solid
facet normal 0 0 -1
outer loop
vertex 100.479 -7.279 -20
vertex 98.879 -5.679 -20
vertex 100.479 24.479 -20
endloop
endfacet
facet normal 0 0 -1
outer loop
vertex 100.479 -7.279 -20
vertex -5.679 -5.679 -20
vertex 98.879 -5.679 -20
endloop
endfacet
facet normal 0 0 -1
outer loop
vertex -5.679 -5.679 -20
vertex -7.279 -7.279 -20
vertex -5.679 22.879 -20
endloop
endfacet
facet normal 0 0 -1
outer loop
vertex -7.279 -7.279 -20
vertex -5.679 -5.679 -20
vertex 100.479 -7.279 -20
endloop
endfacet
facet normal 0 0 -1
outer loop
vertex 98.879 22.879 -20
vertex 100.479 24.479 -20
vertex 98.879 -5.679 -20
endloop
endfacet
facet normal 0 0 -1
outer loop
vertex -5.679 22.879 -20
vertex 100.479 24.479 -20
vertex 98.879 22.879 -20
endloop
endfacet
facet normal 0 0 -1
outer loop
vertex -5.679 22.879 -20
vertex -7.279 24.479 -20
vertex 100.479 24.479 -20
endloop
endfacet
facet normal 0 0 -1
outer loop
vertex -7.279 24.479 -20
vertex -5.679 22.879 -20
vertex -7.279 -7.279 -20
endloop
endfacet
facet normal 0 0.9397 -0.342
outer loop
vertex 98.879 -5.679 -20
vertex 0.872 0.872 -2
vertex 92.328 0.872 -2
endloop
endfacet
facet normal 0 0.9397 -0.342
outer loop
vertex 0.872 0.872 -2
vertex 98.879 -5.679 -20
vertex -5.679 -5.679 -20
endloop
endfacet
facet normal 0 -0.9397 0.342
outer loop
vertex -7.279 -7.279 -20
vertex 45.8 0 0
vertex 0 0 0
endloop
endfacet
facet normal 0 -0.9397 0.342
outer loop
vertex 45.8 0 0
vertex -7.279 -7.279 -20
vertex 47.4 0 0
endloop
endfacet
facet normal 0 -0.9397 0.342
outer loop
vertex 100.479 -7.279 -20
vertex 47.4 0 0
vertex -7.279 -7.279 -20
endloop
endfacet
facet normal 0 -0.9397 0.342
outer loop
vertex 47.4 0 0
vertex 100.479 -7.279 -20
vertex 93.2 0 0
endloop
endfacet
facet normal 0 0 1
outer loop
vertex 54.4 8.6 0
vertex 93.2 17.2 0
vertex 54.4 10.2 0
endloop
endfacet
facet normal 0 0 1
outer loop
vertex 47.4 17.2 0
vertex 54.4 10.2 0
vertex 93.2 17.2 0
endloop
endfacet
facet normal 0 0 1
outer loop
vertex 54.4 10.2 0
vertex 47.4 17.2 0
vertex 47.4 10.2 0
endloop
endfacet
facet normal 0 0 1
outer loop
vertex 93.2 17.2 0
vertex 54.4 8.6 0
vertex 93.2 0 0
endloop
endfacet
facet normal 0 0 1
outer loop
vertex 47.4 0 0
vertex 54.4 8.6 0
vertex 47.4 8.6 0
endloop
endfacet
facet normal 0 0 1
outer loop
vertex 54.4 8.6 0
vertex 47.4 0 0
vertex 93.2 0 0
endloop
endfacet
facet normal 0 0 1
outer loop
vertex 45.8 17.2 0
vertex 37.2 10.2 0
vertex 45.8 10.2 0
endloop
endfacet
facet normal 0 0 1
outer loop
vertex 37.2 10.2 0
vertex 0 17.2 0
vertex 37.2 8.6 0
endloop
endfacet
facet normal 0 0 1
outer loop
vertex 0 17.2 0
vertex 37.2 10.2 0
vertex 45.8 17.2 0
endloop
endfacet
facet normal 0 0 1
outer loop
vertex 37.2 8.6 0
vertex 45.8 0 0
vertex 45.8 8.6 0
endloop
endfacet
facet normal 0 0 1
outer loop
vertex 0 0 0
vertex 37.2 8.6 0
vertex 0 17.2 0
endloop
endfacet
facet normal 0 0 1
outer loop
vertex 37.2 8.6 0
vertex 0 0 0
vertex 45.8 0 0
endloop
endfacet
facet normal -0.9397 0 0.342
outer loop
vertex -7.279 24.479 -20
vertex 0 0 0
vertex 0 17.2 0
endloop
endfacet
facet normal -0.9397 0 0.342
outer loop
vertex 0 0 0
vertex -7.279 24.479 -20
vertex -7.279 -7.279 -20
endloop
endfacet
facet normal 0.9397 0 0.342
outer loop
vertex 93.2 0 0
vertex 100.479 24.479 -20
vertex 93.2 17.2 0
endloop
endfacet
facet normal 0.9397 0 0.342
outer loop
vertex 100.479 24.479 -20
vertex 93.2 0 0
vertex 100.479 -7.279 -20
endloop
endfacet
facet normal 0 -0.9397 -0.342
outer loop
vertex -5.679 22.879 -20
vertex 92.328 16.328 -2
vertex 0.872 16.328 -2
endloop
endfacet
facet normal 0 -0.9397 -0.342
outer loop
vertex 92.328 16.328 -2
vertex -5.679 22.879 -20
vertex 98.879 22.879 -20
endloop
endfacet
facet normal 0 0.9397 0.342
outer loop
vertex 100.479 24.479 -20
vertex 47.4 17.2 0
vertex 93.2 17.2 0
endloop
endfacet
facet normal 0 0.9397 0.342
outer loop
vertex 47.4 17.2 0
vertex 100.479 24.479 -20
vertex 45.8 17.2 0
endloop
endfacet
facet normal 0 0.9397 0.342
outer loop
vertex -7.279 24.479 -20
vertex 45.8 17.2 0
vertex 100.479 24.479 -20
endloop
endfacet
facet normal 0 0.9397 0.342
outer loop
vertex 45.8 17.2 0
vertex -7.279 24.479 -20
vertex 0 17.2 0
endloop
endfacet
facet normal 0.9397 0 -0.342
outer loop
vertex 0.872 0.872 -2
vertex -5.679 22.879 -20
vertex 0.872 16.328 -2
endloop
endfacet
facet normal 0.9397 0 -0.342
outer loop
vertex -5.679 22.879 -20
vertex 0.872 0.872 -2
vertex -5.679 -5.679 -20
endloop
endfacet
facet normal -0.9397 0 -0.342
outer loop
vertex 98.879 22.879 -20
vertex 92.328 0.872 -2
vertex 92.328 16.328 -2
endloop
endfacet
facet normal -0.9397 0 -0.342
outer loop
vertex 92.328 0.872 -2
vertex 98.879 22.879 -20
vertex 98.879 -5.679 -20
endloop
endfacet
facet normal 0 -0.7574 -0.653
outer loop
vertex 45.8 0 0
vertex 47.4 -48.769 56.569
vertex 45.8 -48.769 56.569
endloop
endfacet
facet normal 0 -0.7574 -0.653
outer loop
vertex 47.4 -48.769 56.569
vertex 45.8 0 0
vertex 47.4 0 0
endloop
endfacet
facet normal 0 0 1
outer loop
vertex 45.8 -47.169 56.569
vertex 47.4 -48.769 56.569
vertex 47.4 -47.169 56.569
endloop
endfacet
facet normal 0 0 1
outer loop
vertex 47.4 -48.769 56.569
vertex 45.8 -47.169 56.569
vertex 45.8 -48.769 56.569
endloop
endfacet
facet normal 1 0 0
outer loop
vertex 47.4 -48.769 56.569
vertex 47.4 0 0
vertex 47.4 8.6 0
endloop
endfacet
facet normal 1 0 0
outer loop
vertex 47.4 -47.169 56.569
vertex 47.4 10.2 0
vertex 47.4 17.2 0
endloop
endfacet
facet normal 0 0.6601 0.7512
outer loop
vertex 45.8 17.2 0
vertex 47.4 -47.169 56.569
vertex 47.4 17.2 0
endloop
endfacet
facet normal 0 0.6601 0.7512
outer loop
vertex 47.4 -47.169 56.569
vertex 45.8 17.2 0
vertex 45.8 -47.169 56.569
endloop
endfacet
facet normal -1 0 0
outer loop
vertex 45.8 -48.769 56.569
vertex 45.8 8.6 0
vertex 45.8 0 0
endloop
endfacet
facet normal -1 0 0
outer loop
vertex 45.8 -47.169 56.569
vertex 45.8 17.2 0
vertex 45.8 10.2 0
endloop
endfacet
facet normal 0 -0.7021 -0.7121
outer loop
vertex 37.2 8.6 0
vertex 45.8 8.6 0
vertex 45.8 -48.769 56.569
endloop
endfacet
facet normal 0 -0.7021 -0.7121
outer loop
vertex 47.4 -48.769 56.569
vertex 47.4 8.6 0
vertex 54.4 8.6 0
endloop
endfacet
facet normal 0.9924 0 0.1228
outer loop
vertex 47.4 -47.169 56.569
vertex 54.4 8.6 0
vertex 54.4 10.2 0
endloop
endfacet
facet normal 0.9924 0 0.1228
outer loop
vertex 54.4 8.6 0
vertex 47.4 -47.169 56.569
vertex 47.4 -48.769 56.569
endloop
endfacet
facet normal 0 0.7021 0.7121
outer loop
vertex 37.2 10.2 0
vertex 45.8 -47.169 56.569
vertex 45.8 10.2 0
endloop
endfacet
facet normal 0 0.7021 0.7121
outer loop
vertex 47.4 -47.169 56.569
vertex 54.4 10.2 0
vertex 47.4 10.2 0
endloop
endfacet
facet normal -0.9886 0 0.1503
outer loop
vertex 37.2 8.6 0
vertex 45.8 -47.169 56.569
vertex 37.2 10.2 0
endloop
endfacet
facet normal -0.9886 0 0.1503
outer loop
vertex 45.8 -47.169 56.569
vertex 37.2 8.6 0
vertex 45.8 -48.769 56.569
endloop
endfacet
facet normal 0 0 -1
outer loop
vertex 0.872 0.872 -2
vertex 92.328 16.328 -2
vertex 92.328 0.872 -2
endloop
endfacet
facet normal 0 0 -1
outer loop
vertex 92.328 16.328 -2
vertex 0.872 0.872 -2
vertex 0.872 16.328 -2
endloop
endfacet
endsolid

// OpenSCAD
/*
* LED_Yard_Stake.scad
*
* Project: LED Yard Stake - Parametric yard steak for low wattage LED modules
* Copyright (c) 2016 Shelby Merrick
* http://www.forkineye.com
*
*  This program is provided free for you to use in any way that you wish,
*  subject to the laws and regulations where you are using it.  Due diligence
*  is strongly suggested before using this code.  Please give credit where due.
*
*  The Author makes no warranty of any kind, express or implied, with regard
*  to this program or the documentation contained in this document.  The
*  Author shall not be liable in any event for incidental or consequential
*  damages in connection with, or arising out of, the furnishing, performance
*  or use of these programs.
*
*/

/******************************/
/***** USER CONFIGURATION *****/
/******************************/

base_width = 90;        // Internal width, where LED mounts
base_depth = 14;        // Internal depth, where LED mounts

shroud_height = 20;     // Height of shroud, from bottom of base
shroud_angle = 40;      // Projection angle of shroud
shroud_thickness = 1.6; // Wall thickness of shroud

stake_length = 80;      // Length of ground stake
stake_angle = 45;       // Angle of ground stake
stake_thickness = 1.6;  // Thickness of stake spikes

/*************************************/
/***** END OF USER CONFIGURATION *****/
/*************************************/

// Globals - Don't change
width = base_width + shroud_thickness * 2;
depth = base_depth + shroud_thickness * 2;

// Bottom of shroud
module base() {
    cube([width, depth, 2]);
}

// Sides of shroud
module sides() {
    // Front
    translate([0, shroud_thickness, 0]) mirror([0,1,0]) side(width);
    
    // Back
    translate([0, depth - shroud_thickness, 0]) side(width);
    
    // Left Side
    translate([shroud_thickness, 0, 0]) rotate(a=90, v=[0,0,1]) side(depth);
    
    // Right Side
    translate([width - shroud_thickness, depth, 0]) rotate(a=-90, v=[0,0,1]) side(depth);
}

// Polyhedron for a single side
module side(_width) {
    height = shroud_height;
    thick = shroud_thickness;
    offset = shroud_height / (tan(90 - (shroud_angle / 2)));
    
    points = [
      [0, 0, 0],                                    //0
      [_width, 0, 0],                               //1
      [_width, thick, 0],                           //2
      [0, thick, 0],                                //3
      [-offset, offset, height],                    //4
      [_width + offset, offset, height],            //5
      [_width + offset, thick + offset, height],    //6
      [-offset, thick + offset, height]];           //7
      
    faces = [
      [0,1,2,3],  // Bottom
      [4,5,1,0],  // Front
      [7,6,5,4],  // Top
      [5,6,2,1],  // Right
      [6,7,3,2],  // Back
      [7,4,0,3]]; // Left
      
    polyhedron(points, faces);
}

// Ground Stake
module stake() {
    thick = shroud_thickness;
    height = stake_length * cos(stake_angle);
    offset = stake_length * sin(stake_angle);

    faces = [
      [0,1,2,3],  // Bottom
      [4,5,1,0],  // Front
      [7,6,5,4],  // Top
      [5,6,2,1],  // Right
      [6,7,3,2],  // Back
      [7,4,0,3]]; // Left
    
    pointsY = [
      [0, 0, 0],                                            //0
      [thick, 0, 0],                                        //1
      [thick, depth, 0],                                    //2
      [0, depth, 0],                                        //3
      [0, depth / 2 - (thick / 2) - offset, -height],       //4
      [thick, depth / 2 - (thick / 2) - offset, -height],   //5
      [thick, depth / 2 + (thick / 2) - offset, -height],   //6
      [0, depth / 2 + (thick / 2) - offset, -height]];      //7
      
    translate([width / 2 - thick / 2, 0, 0])
        polyhedron(pointsY, faces);
    
    pointsX = [
      [0, depth / 2, 0],                                                //0
      [depth, depth / 2, 0],                                            //1
      [depth, depth / 2 + thick, 0],                                    //2
      [0, depth / 2 + thick, 0],                                        //3
      [0 + depth / 2, depth / 2 - (thick / 2) - offset, -height],       //4
      [thick + depth / 2, depth / 2 - (thick / 2) - offset, -height],   //5
      [thick + depth / 2, depth / 2 + (thick / 2) - offset, -height],   //6
      [0 + depth / 2, depth / 2 + (thick / 2) - offset, -height]];      //7
    
    translate([width / 2 - depth / 2 - thick / 2, 0, 0])
        polyhedron(pointsX, faces);    
}

// Flip everything upside down for printing
mirror([0,0,1]) {
    base();
    sides();
    stake();
}
